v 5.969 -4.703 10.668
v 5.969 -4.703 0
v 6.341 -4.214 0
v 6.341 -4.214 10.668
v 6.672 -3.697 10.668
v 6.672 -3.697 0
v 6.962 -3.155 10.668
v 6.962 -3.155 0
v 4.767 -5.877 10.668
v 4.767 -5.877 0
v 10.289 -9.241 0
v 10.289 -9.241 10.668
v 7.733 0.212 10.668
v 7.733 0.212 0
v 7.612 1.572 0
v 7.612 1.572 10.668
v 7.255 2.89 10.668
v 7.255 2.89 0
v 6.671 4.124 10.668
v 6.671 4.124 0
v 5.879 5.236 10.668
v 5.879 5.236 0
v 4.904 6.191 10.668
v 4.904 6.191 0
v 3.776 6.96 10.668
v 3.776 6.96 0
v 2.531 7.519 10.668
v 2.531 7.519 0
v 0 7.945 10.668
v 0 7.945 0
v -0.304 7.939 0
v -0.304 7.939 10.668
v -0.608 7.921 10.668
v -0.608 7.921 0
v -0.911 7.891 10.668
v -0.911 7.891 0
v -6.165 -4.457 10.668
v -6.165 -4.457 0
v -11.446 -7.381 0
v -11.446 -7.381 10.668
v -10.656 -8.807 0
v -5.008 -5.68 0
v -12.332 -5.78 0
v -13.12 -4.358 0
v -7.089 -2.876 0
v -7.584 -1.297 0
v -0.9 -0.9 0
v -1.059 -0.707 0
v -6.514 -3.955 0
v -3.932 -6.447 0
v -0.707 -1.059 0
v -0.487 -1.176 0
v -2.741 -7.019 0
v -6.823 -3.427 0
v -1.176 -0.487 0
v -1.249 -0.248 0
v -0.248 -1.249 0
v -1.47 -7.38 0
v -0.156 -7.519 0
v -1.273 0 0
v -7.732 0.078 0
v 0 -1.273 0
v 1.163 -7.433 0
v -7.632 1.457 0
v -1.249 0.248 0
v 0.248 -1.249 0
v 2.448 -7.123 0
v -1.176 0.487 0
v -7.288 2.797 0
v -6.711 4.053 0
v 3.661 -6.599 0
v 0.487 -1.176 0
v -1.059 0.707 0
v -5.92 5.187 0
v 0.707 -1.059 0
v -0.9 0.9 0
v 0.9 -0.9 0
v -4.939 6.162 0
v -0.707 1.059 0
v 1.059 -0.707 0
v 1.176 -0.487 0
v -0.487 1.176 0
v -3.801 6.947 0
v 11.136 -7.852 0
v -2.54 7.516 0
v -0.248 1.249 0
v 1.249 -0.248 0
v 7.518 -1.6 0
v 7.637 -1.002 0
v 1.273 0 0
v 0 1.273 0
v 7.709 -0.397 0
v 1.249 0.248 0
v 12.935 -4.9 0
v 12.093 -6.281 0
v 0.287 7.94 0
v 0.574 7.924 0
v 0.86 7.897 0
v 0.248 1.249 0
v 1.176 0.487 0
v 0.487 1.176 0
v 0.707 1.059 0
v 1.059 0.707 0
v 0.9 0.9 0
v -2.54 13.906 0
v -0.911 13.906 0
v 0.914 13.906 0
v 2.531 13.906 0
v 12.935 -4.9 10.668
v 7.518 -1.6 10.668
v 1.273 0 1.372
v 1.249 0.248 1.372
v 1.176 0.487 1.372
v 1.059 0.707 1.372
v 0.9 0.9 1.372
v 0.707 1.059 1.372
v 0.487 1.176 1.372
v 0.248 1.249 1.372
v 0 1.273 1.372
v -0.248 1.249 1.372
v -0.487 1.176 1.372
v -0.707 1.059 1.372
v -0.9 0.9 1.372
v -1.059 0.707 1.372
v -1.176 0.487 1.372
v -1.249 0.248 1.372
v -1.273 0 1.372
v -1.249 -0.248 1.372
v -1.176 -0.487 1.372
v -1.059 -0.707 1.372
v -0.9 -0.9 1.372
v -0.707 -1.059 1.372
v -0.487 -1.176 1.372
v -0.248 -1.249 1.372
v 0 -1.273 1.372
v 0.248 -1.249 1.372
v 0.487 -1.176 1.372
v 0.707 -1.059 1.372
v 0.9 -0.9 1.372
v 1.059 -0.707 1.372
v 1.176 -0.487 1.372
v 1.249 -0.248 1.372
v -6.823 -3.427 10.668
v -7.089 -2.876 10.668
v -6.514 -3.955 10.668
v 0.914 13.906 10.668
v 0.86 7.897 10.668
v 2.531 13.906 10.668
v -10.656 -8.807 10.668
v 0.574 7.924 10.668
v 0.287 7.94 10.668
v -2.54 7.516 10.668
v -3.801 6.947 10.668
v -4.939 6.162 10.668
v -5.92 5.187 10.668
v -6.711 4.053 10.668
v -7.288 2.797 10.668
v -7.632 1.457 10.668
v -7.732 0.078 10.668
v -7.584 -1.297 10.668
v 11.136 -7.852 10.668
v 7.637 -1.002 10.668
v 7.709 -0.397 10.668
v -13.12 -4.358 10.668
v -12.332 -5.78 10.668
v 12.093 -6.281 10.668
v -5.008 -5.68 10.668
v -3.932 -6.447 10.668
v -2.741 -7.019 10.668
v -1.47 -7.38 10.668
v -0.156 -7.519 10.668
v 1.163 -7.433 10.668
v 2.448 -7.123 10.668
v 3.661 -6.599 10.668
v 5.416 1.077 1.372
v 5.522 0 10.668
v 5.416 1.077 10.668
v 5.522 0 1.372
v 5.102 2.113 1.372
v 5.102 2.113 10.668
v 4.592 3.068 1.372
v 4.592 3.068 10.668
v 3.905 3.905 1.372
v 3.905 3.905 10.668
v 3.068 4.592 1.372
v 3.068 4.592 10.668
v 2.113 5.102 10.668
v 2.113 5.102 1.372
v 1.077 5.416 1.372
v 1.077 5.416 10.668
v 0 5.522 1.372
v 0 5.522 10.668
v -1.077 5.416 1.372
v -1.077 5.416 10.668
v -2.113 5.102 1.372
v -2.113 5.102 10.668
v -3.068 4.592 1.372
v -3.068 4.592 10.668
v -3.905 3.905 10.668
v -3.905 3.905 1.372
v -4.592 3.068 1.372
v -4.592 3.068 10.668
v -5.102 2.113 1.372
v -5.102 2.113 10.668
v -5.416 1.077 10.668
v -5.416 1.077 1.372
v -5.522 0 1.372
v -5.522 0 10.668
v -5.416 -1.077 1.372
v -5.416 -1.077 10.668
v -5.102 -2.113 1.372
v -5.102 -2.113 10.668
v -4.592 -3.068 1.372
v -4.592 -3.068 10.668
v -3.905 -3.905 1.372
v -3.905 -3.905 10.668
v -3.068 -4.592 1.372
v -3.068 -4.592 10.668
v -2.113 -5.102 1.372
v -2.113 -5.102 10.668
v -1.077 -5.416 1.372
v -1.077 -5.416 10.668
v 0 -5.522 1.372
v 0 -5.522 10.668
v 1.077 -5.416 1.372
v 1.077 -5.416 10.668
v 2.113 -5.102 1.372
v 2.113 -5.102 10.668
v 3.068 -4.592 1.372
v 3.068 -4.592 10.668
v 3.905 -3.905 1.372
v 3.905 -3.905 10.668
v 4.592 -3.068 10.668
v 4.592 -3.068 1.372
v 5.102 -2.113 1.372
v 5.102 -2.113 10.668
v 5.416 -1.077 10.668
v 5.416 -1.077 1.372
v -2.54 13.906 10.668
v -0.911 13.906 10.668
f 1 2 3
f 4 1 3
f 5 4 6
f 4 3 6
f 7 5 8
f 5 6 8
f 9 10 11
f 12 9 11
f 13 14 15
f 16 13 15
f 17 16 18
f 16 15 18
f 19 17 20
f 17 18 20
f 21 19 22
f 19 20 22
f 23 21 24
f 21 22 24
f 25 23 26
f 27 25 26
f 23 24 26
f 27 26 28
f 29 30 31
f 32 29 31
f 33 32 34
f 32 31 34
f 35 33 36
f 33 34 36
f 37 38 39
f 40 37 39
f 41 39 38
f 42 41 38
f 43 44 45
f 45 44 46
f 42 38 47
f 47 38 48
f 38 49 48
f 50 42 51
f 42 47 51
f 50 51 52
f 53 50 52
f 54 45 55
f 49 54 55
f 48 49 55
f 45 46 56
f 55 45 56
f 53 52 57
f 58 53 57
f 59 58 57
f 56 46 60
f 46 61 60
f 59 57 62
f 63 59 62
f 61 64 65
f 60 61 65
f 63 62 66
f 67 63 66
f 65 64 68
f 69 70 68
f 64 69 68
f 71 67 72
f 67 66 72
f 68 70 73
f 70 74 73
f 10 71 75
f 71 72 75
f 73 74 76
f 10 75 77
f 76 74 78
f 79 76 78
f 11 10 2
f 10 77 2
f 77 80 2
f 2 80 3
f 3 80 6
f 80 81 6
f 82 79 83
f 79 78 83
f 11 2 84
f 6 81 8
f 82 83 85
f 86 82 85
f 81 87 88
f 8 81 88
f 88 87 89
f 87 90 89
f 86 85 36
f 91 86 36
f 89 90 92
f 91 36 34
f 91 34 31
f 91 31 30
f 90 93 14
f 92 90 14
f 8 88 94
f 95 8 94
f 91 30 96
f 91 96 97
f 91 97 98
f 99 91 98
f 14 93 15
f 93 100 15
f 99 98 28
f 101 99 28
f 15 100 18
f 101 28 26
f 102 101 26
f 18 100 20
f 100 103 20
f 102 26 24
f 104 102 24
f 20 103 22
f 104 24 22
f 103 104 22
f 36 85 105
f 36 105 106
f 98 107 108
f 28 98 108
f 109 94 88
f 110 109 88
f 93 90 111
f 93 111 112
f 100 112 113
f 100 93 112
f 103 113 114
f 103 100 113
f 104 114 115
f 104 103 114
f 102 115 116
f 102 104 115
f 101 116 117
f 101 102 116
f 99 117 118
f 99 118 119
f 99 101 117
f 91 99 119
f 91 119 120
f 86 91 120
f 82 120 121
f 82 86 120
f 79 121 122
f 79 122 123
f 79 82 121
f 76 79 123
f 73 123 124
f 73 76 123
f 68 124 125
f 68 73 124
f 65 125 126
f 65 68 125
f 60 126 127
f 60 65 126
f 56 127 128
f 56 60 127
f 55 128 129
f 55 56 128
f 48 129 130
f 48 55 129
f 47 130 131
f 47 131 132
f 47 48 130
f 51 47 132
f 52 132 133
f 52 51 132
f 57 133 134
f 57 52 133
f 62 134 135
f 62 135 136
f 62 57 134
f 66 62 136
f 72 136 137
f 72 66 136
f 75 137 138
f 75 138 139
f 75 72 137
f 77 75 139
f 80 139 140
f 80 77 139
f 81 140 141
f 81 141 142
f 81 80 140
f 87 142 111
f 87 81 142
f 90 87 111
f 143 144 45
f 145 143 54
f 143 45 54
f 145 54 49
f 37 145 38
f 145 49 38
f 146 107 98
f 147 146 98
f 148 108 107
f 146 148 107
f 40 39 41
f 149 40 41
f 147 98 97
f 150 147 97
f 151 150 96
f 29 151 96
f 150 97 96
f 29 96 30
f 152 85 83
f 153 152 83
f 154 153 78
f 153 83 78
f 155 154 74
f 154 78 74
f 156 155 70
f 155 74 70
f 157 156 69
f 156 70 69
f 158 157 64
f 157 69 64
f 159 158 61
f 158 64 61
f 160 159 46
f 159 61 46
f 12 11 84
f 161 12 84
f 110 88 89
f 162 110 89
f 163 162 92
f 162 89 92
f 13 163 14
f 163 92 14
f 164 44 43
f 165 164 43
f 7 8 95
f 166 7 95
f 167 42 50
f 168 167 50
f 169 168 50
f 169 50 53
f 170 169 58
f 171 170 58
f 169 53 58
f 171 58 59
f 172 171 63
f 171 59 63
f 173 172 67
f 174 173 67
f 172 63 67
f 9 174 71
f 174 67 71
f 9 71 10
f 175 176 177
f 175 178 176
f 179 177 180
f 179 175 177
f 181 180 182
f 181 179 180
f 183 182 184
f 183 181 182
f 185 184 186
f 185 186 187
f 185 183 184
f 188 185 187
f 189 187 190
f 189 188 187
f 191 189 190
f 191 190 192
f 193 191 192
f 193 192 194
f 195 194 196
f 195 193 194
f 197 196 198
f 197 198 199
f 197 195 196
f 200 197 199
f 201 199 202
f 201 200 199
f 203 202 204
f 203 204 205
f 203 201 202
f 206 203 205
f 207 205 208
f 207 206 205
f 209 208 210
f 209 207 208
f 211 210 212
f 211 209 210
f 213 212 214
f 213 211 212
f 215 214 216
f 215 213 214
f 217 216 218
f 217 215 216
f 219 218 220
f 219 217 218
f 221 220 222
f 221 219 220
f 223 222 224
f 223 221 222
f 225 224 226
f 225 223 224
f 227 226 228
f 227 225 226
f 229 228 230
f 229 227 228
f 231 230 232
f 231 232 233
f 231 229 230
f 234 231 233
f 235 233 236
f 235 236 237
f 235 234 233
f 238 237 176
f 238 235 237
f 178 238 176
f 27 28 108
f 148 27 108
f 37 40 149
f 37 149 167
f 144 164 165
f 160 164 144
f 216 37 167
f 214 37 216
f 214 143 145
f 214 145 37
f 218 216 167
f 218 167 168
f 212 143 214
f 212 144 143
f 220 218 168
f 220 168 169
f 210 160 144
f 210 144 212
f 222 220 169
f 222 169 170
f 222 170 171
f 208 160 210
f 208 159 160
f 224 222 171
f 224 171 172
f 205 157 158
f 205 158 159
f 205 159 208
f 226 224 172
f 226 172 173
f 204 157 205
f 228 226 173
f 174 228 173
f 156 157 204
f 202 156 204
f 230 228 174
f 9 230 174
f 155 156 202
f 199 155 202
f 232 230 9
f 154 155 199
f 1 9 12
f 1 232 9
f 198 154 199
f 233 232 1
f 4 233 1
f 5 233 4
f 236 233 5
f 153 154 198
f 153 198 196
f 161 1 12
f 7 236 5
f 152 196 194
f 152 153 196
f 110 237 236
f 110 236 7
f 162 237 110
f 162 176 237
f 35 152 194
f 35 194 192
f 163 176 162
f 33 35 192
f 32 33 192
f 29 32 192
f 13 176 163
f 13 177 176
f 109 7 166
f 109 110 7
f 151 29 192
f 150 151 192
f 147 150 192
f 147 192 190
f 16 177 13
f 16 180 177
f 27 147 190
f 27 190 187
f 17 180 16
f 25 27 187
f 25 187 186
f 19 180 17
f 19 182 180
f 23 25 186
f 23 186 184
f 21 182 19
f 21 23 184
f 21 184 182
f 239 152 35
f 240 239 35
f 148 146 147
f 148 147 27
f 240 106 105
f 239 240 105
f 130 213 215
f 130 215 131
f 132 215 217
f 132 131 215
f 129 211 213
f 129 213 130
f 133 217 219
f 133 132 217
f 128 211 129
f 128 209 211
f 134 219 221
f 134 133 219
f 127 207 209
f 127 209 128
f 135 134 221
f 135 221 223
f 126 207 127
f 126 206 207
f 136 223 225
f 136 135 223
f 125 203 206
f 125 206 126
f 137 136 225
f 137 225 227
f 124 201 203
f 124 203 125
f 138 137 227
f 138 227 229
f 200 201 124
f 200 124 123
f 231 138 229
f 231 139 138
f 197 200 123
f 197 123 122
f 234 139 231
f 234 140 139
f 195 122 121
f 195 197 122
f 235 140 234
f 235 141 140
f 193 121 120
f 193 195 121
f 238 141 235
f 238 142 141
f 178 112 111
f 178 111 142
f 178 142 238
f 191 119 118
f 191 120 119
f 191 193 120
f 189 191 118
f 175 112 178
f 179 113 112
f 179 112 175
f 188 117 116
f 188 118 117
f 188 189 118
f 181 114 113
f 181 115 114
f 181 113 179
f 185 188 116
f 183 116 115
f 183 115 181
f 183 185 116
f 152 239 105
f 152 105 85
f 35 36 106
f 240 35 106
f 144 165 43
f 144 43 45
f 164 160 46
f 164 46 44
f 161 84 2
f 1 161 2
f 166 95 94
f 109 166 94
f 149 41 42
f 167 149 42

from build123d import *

# Parameters (mm, degrees)
F0_R     = 5.522275
F0_R_2   = 1.27325
F1_DEPTH = 1.3716
F2_DEPTH = 7.6962
F3_DEPTH = 9.652
F4_DEPTH = 10.668


with BuildPart() as f1:
    # F0 (on Top) → F1 (new body)
    with BuildSketch(Plane.XY):
        Circle(F0_R)
        Circle(F0_R_2, mode=Mode.SUBTRACT)
    extrude(amount=F1_DEPTH)

    # F0 (on Top) → F2 (join)
    with BuildSketch(Plane.XY):
        with BuildLine():
            ThreePointArc((7.517685, -1.599688), (7.678957, -0.700082), (7.732966, 0.212269))
            ThreePointArc((7.732966, 0.212269), (6.299561, 4.697166), (2.530744, 7.519396))
            ThreePointArc((2.530744, 7.519396), (1.706006, 7.754703), (0.860282, 7.897234))
            ThreePointArc((0.860282, 7.897234), (0.43081, 7.933226), (0, 7.945235))
            ThreePointArc((0, 7.945235), (-0.456383, 7.931756), (-0.911175, 7.891366))
            ThreePointArc((-0.911175, 7.891366), (-0.921549, 7.890128), (-0.93192, 7.888876))
            ThreePointArc((-0.93192, 7.888876), (-1.746141, 7.745513), (-2.540403, 7.516043))
            ThreePointArc((-2.540403, 7.516043), (-6.71147, 4.053485), (-7.584297, -1.296775))
            ThreePointArc((-7.584297, -1.296775), (-7.3792, -2.099913), (-7.089314, -2.876483))
            ThreePointArc((-7.089314, -2.876483), (-6.673834, -3.693971), (-6.164503, -4.456529))
            ThreePointArc((-6.164503, -4.456529), (-5.619672, -5.099798), (-5.008058, -5.67994))
            ThreePointArc((-5.008058, -5.67994), (-0.155544, -7.519133), (4.767017, -5.8766))
            ThreePointArc((4.767017, -5.8766), (5.40017, -5.322795), (5.969425, -4.703495))
            ThreePointArc((5.969425, -4.703495), (6.511698, -3.958649), (6.961536, -3.154597))
            ThreePointArc((6.961536, -3.154597), (7.281236, -2.392031), (7.517685, -1.599688))
        make_face()
        Circle(F0_R, mode=Mode.SUBTRACT)
    extrude(amount=F2_DEPTH)

    # F0 (on Top) → F3 (join)
    with BuildSketch(Plane.XY):
        with BuildLine():
            ThreePointArc((7.517685, -1.599688), (7.678957, -0.700082), (7.732966, 0.212269))
            ThreePointArc((7.732966, 0.212269), (6.299561, 4.697166), (2.530744, 7.519396))
            ThreePointArc((2.530744, 7.519396), (1.706006, 7.754703), (0.860282, 7.897234))
            ThreePointArc((0.860282, 7.897234), (0.43081, 7.933226), (0, 7.945235))
            ThreePointArc((0, 7.945235), (-0.456383, 7.931756), (-0.911175, 7.891366))
            ThreePointArc((-0.911175, 7.891366), (-0.921549, 7.890128), (-0.93192, 7.888876))
            ThreePointArc((-0.93192, 7.888876), (-1.746141, 7.745513), (-2.540403, 7.516043))
            ThreePointArc((-2.540403, 7.516043), (-6.71147, 4.053485), (-7.584297, -1.296775))
            ThreePointArc((-7.584297, -1.296775), (-7.3792, -2.099913), (-7.089314, -2.876483))
            ThreePointArc((-7.089314, -2.876483), (-6.673834, -3.693971), (-6.164503, -4.456529))
            ThreePointArc((-6.164503, -4.456529), (-5.619672, -5.099798), (-5.008058, -5.67994))
            ThreePointArc((-5.008058, -5.67994), (-0.155544, -7.519133), (4.767017, -5.8766))
            ThreePointArc((4.767017, -5.8766), (5.40017, -5.322795), (5.969425, -4.703495))
            ThreePointArc((5.969425, -4.703495), (6.511698, -3.958649), (6.961536, -3.154597))
            ThreePointArc((6.961536, -3.154597), (7.281236, -2.392031), (7.517685, -1.599688))
        make_face()
        Circle(F0_R, mode=Mode.SUBTRACT)
        with BuildLine():
            ThreePointArc((0.860282, 7.897234), (1.706006, 7.754703), (2.530744, 7.519396))
            Line((2.530744, 7.519396), (2.530744, 13.906265))
            Line((2.530744, 13.906265), (0.914411, 13.906265))
            Line((0.914411, 13.906265), (0.860282, 7.897234))
        make_face()
        with BuildLine():
            Line((12.93451, -4.900329), (7.517685, -1.599688))
            ThreePointArc((7.517685, -1.599688), (7.281236, -2.392031), (6.961536, -3.154597))
            Line((6.961536, -3.154597), (12.093005, -6.28136))
            Line((12.093005, -6.28136), (12.93451, -4.900329))
        make_face()
        with BuildLine():
            Line((11.13613, -7.851729), (5.969425, -4.703495))
            ThreePointArc((5.969425, -4.703495), (5.40017, -5.322795), (4.767017, -5.8766))
            Line((4.767017, -5.8766), (10.2893, -9.241499))
            Line((10.2893, -9.241499), (11.13613, -7.851729))
        make_face()
        with BuildLine():
            ThreePointArc((-0.93192, 7.888876), (-0.921549, 7.890128), (-0.911175, 7.891366))
            Line((-0.911175, 7.891366), (-0.911175, 13.906265))
            Line((-0.911175, 13.906265), (-2.540403, 13.906265))
            Line((-2.540403, 13.906265), (-2.540403, 7.516043))
            ThreePointArc((-2.540403, 7.516043), (-1.746141, 7.745513), (-0.93192, 7.888876))
        make_face()
        with BuildLine():
            Line((-10.655986, -8.807297), (-5.008058, -5.67994))
            ThreePointArc((-5.008058, -5.67994), (-5.619672, -5.099798), (-6.164503, -4.456529))
            Line((-6.164503, -4.456529), (-11.445815, -7.380884))
            Line((-11.445815, -7.380884), (-10.655986, -8.807297))
        make_face()
        with BuildLine():
            ThreePointArc((-7.089314, -2.876483), (-7.3792, -2.099913), (-7.584297, -1.296775))
            Line((-7.584297, -1.296775), (-13.11972, -4.357855))
            Line((-13.11972, -4.357855), (-12.332427, -5.779687))
            Line((-12.332427, -5.779687), (-7.089314, -2.876483))
        make_face()
    extrude(amount=F3_DEPTH)

    # F0 (on Top) → F4 (join)
    with BuildSketch(Plane.XY):
        with BuildLine():
            ThreePointArc((7.517685, -1.599688), (7.678957, -0.700082), (7.732966, 0.212269))
            ThreePointArc((7.732966, 0.212269), (6.299561, 4.697166), (2.530744, 7.519396))
            ThreePointArc((2.530744, 7.519396), (1.706006, 7.754703), (0.860282, 7.897234))
            ThreePointArc((0.860282, 7.897234), (0.43081, 7.933226), (0, 7.945235))
            ThreePointArc((0, 7.945235), (-0.456383, 7.931756), (-0.911175, 7.891366))
            ThreePointArc((-0.911175, 7.891366), (-0.921549, 7.890128), (-0.93192, 7.888876))
            ThreePointArc((-0.93192, 7.888876), (-1.746141, 7.745513), (-2.540403, 7.516043))
            ThreePointArc((-2.540403, 7.516043), (-6.71147, 4.053485), (-7.584297, -1.296775))
            ThreePointArc((-7.584297, -1.296775), (-7.3792, -2.099913), (-7.089314, -2.876483))
            ThreePointArc((-7.089314, -2.876483), (-6.673834, -3.693971), (-6.164503, -4.456529))
            ThreePointArc((-6.164503, -4.456529), (-5.619672, -5.099798), (-5.008058, -5.67994))
            ThreePointArc((-5.008058, -5.67994), (-0.155544, -7.519133), (4.767017, -5.8766))
            ThreePointArc((4.767017, -5.8766), (5.40017, -5.322795), (5.969425, -4.703495))
            ThreePointArc((5.969425, -4.703495), (6.511698, -3.958649), (6.961536, -3.154597))
            ThreePointArc((6.961536, -3.154597), (7.281236, -2.392031), (7.517685, -1.599688))
        make_face()
        Circle(F0_R, mode=Mode.SUBTRACT)
        with BuildLine():
            ThreePointArc((0.860282, 7.897234), (1.706006, 7.754703), (2.530744, 7.519396))
            Line((2.530744, 7.519396), (2.530744, 13.906265))
            Line((2.530744, 13.906265), (0.914411, 13.906265))
            Line((0.914411, 13.906265), (0.860282, 7.897234))
        make_face()
        with BuildLine():
            Line((12.93451, -4.900329), (7.517685, -1.599688))
            ThreePointArc((7.517685, -1.599688), (7.281236, -2.392031), (6.961536, -3.154597))
            Line((6.961536, -3.154597), (12.093005, -6.28136))
            Line((12.093005, -6.28136), (12.93451, -4.900329))
        make_face()
        with BuildLine():
            Line((11.13613, -7.851729), (5.969425, -4.703495))
            ThreePointArc((5.969425, -4.703495), (5.40017, -5.322795), (4.767017, -5.8766))
            Line((4.767017, -5.8766), (10.2893, -9.241499))
            Line((10.2893, -9.241499), (11.13613, -7.851729))
        make_face()
        with BuildLine():
            ThreePointArc((-0.93192, 7.888876), (-0.921549, 7.890128), (-0.911175, 7.891366))
            Line((-0.911175, 7.891366), (-0.911175, 13.906265))
            Line((-0.911175, 13.906265), (-2.540403, 13.906265))
            Line((-2.540403, 13.906265), (-2.540403, 7.516043))
            ThreePointArc((-2.540403, 7.516043), (-1.746141, 7.745513), (-0.93192, 7.888876))
        make_face()
        with BuildLine():
            Line((-10.655986, -8.807297), (-5.008058, -5.67994))
            ThreePointArc((-5.008058, -5.67994), (-5.619672, -5.099798), (-6.164503, -4.456529))
            Line((-6.164503, -4.456529), (-11.445815, -7.380884))
            Line((-11.445815, -7.380884), (-10.655986, -8.807297))
        make_face()
        with BuildLine():
            ThreePointArc((-7.089314, -2.876483), (-7.3792, -2.099913), (-7.584297, -1.296775))
            Line((-7.584297, -1.296775), (-13.11972, -4.357855))
            Line((-13.11972, -4.357855), (-12.332427, -5.779687))
            Line((-12.332427, -5.779687), (-7.089314, -2.876483))
        make_face()
    extrude(amount=F4_DEPTH)


solid = f1.part
